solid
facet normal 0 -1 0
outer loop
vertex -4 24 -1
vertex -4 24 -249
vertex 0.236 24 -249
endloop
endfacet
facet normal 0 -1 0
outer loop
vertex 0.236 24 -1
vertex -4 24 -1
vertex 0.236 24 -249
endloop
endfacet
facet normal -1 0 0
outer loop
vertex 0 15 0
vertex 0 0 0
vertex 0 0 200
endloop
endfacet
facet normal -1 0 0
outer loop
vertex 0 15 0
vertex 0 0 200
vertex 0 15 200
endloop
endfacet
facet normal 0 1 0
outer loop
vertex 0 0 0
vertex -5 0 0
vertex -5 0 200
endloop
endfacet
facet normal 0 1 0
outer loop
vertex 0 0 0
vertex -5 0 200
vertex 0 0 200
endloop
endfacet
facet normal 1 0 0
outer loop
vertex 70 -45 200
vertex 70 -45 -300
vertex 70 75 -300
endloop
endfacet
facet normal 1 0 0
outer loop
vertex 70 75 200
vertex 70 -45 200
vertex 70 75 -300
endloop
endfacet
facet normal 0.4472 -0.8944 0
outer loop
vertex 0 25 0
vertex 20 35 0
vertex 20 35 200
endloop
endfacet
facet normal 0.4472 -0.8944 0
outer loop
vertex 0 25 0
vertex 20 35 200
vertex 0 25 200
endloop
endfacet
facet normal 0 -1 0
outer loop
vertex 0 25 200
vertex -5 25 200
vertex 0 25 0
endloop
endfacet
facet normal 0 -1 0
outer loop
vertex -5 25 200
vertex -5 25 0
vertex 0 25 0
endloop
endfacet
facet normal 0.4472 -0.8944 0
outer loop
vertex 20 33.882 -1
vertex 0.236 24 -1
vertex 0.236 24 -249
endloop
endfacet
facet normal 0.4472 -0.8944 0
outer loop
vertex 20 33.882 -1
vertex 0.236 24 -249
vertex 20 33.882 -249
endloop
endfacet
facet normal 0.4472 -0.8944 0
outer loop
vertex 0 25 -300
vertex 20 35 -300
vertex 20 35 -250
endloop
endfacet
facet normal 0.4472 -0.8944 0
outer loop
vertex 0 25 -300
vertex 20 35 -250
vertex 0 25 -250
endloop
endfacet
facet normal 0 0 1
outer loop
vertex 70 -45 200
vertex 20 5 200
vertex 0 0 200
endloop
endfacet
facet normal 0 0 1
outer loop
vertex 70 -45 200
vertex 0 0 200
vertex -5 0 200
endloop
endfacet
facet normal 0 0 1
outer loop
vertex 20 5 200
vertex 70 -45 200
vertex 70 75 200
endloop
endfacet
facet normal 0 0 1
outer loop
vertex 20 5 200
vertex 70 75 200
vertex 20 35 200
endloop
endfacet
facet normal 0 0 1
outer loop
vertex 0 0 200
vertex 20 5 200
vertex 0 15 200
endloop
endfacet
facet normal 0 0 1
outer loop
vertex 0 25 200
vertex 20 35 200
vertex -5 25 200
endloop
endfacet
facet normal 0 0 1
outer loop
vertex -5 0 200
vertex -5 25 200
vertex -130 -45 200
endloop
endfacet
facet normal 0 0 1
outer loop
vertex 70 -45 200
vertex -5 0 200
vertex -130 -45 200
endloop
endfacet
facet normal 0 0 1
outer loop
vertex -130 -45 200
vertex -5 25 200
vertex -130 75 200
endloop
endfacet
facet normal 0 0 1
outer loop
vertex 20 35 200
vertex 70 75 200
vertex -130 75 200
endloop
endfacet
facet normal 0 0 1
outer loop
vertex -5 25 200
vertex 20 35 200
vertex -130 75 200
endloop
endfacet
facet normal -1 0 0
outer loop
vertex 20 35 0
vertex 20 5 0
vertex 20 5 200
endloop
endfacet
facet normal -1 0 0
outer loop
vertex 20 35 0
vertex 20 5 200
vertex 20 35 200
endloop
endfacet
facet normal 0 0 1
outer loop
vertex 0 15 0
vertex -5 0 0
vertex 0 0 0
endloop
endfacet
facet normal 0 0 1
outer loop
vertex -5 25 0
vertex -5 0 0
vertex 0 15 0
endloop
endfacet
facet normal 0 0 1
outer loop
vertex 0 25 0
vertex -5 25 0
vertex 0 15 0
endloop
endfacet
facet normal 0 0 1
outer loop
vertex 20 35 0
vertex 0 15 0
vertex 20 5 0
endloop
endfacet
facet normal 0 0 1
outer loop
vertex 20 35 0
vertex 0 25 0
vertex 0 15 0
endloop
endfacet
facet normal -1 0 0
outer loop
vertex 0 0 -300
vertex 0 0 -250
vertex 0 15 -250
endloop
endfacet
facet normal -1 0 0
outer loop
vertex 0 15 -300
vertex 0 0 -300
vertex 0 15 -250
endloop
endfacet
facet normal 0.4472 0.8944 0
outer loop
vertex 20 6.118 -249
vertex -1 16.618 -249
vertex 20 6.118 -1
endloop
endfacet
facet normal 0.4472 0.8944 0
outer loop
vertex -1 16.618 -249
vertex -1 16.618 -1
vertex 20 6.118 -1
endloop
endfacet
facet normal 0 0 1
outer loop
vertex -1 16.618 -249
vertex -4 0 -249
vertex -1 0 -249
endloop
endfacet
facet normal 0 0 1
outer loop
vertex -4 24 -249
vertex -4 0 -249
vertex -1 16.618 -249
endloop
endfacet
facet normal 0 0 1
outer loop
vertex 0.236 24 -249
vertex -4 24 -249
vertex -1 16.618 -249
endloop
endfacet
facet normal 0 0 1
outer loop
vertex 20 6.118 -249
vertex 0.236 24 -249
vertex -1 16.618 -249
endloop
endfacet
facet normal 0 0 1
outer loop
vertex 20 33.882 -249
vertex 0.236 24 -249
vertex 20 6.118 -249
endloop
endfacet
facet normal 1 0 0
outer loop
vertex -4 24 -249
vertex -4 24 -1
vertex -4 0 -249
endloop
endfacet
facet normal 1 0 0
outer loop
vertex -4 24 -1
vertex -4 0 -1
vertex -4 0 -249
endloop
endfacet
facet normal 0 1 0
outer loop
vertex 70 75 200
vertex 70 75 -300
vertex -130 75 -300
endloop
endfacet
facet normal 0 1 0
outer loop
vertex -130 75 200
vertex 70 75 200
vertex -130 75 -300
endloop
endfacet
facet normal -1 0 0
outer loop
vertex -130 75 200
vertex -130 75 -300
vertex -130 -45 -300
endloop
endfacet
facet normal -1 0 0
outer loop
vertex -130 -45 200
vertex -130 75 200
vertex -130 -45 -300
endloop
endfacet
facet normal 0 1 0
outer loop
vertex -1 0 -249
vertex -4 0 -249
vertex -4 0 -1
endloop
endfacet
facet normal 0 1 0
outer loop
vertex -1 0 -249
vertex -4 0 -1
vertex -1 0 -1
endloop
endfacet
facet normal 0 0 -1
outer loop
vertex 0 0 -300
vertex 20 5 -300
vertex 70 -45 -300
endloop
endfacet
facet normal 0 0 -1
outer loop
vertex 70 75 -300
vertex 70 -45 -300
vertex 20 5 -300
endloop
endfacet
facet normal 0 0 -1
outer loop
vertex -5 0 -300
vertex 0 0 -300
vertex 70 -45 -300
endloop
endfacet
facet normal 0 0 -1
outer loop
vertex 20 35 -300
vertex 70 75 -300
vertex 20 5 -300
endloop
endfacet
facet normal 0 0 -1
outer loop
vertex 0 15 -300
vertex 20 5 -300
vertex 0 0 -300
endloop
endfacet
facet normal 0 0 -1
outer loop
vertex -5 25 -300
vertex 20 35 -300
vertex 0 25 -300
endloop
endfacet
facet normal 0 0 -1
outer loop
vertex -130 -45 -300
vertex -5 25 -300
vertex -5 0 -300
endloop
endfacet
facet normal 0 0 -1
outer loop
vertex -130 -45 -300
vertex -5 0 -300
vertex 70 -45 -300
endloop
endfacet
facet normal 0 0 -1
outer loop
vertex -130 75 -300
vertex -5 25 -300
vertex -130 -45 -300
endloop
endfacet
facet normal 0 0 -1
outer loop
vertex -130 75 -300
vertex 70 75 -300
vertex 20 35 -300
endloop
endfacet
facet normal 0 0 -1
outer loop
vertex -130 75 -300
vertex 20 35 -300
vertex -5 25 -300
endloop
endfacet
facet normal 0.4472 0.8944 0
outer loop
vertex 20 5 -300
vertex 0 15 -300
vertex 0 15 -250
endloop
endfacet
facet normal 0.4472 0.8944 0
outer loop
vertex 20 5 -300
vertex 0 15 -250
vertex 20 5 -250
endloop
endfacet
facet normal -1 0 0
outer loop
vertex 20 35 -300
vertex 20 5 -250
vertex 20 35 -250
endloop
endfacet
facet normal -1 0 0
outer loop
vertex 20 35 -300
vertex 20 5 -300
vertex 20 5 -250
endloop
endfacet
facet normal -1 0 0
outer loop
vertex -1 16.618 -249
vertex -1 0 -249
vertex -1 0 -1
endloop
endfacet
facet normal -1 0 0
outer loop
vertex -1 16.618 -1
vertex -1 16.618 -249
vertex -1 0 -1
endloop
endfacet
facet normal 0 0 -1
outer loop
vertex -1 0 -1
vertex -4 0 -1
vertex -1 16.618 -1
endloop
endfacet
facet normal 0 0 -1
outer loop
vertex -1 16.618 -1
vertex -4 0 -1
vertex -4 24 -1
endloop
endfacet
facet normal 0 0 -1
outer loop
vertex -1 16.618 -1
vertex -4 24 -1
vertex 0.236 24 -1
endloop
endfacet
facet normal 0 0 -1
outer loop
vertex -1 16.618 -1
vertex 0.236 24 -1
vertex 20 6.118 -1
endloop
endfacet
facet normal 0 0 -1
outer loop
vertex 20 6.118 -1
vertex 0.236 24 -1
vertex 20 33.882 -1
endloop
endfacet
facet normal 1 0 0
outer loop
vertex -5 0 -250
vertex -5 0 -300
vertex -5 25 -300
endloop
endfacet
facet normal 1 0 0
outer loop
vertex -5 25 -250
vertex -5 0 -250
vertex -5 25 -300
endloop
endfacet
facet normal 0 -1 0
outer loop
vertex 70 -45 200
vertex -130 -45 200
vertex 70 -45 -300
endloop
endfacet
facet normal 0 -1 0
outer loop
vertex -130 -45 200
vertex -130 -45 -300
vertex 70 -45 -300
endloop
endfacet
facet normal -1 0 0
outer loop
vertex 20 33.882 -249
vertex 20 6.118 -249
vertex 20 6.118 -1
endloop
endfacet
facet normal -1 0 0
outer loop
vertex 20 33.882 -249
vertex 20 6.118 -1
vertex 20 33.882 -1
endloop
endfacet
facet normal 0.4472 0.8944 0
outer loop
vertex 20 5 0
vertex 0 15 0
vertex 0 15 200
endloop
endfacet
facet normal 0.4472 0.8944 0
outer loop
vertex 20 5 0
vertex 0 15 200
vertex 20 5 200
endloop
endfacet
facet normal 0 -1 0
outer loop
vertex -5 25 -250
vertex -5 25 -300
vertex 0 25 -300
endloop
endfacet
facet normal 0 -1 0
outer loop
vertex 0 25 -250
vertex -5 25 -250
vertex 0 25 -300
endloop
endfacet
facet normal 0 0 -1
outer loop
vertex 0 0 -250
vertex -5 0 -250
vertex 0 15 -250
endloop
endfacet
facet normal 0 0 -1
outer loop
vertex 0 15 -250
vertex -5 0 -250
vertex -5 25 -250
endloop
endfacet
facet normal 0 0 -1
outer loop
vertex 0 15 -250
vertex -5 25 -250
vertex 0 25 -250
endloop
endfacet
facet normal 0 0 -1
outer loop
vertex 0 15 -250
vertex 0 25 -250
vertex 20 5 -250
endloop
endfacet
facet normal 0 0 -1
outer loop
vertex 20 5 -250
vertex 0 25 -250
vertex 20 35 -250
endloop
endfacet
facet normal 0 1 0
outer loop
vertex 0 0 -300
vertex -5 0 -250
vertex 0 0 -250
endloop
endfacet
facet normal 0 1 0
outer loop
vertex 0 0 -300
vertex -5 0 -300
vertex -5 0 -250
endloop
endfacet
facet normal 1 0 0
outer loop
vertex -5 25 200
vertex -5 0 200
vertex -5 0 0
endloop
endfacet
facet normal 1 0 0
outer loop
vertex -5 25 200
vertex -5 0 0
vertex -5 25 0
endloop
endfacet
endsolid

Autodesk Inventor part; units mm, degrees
ref_plane "YZ Plane" through (0, 0, 0) normal (1, 0, 0) x (0, 1, 0)
ref_plane "XZ Plane" through (0, 0, 0) normal (0, 1, 0) x (-1, 0, 0)
ref_plane "XY Plane" through (0, 0, 0) normal (0, 0, 1) x (1, 0, 0)
sketch "草圖1" plane through (0, 0, 0) normal (0, 1, 0) x (-1, 0, 0)
  line L0 (0, 0) -> (5, 0)
  line L1 (5, 0) -> (5, -250)
  line L2 (5, -250) -> (0, -250)
  line L3 (0, -250) -> (0, 0)
  dimension "d0" = 5
  dimension "d1" = 250
extrude "擠出1" add sketch "草圖1" along normal blind 15
sketch "草圖3" plane through (0, 15, 0) normal (0, 1, 0) x (1, 0, 0)
  line L0 (0, 250) -> (-5, 250) projected
  line L1 (0, 0) -> (-5, 0)
  line L2 (-5, 0) -> (-5, 250)
  line L3 (-5, 250) -> (0, 250)
  line L4 (0, 250) -> (0, 0)
extrude "擠出3" add sketch "草圖3" along normal blind 10
sketch "草圖4" plane through (-5, 0, 0) normal (0, 0, 1) x (1, 0, 0)
  line L0 (5, 0) -> (5, 25) projected
  line L1 (0, 25) -> (5, 25) projected
  line L2 (5, 25) -> (0, 25) projected
  line L3 (5, 25) -> (25, 35)
  line L4 (5, 15) -> (25, 5)
  line L5 (25, 5) -> (25, 35)
  line L6 (0, 0) -> (5, 0) projected
  line L7 (0, 0) -> (0, 25) projected
  line L8 (-5, 0) -> (30, 0) projected
  dimension "d8" = 10
  dimension "d9" = 30
  dimension "d19" = 20
extrude "擠出4" add sketch "草圖4" against normal up to surface (250 mm away) contours L0 L3 L5 L4
shell "薄殼2" thickness 1 removed faces 2 at (20, 15, -83.3333) at (-1.6667, 0, -83.3333)
ref_plane "工作平面1" through (0, 0, -300) normal (0, 0, -1) x (-1, 0, 0)
sketch "草圖5" plane through (0, 0, -300) normal (0, 0, -1) x (-1, 0, 0)
  line L0 (5, 0) -> (0, 0) projected
  line L1 (0, 0) -> (0, 15) projected
  line L2 (0, 15) -> (-20, 5) projected
  line L3 (-20, 5) -> (-20, 35) projected
  line L4 (-20, 35) -> (0, 25) projected
  line L5 (5, 25) -> (0, 25) projected
  line L6 (5, 0) -> (5, 25) projected
  line L7 (130, -45) -> (-70, -45)
  line L8 (-70, -45) -> (-70, 75)
  line L9 (-70, 75) -> (130, 75)
  line L10 (130, 75) -> (130, -45)
  dimension "d25" = 200
  dimension "d26" = 120
  dimension "d27" = 50
  dimension "d28" = 50
extrude "擠出5" add sketch "草圖5" against normal blind 500
equation "\"d0\" = bottom_w"
equation "\"d1\" = bottom_l"
equation "\"d2\" = bottom_h"
equation "\"d6\" = nuzzle_lh"
equation "\"d8\" = nuzzle_lh"
equation "\"d9\" = 3 * nuzzle_lh"
equation "\"d15\" = nuzzle_lh"
equation "\"bottom_w\" = 5"
equation "\"bottom_l\" = 250"
equation "\"bottom_h\" = 15"
equation "\"nuzzle_lh\" = 10"
properties part number "nuzzle_v1_0310_fluent"
